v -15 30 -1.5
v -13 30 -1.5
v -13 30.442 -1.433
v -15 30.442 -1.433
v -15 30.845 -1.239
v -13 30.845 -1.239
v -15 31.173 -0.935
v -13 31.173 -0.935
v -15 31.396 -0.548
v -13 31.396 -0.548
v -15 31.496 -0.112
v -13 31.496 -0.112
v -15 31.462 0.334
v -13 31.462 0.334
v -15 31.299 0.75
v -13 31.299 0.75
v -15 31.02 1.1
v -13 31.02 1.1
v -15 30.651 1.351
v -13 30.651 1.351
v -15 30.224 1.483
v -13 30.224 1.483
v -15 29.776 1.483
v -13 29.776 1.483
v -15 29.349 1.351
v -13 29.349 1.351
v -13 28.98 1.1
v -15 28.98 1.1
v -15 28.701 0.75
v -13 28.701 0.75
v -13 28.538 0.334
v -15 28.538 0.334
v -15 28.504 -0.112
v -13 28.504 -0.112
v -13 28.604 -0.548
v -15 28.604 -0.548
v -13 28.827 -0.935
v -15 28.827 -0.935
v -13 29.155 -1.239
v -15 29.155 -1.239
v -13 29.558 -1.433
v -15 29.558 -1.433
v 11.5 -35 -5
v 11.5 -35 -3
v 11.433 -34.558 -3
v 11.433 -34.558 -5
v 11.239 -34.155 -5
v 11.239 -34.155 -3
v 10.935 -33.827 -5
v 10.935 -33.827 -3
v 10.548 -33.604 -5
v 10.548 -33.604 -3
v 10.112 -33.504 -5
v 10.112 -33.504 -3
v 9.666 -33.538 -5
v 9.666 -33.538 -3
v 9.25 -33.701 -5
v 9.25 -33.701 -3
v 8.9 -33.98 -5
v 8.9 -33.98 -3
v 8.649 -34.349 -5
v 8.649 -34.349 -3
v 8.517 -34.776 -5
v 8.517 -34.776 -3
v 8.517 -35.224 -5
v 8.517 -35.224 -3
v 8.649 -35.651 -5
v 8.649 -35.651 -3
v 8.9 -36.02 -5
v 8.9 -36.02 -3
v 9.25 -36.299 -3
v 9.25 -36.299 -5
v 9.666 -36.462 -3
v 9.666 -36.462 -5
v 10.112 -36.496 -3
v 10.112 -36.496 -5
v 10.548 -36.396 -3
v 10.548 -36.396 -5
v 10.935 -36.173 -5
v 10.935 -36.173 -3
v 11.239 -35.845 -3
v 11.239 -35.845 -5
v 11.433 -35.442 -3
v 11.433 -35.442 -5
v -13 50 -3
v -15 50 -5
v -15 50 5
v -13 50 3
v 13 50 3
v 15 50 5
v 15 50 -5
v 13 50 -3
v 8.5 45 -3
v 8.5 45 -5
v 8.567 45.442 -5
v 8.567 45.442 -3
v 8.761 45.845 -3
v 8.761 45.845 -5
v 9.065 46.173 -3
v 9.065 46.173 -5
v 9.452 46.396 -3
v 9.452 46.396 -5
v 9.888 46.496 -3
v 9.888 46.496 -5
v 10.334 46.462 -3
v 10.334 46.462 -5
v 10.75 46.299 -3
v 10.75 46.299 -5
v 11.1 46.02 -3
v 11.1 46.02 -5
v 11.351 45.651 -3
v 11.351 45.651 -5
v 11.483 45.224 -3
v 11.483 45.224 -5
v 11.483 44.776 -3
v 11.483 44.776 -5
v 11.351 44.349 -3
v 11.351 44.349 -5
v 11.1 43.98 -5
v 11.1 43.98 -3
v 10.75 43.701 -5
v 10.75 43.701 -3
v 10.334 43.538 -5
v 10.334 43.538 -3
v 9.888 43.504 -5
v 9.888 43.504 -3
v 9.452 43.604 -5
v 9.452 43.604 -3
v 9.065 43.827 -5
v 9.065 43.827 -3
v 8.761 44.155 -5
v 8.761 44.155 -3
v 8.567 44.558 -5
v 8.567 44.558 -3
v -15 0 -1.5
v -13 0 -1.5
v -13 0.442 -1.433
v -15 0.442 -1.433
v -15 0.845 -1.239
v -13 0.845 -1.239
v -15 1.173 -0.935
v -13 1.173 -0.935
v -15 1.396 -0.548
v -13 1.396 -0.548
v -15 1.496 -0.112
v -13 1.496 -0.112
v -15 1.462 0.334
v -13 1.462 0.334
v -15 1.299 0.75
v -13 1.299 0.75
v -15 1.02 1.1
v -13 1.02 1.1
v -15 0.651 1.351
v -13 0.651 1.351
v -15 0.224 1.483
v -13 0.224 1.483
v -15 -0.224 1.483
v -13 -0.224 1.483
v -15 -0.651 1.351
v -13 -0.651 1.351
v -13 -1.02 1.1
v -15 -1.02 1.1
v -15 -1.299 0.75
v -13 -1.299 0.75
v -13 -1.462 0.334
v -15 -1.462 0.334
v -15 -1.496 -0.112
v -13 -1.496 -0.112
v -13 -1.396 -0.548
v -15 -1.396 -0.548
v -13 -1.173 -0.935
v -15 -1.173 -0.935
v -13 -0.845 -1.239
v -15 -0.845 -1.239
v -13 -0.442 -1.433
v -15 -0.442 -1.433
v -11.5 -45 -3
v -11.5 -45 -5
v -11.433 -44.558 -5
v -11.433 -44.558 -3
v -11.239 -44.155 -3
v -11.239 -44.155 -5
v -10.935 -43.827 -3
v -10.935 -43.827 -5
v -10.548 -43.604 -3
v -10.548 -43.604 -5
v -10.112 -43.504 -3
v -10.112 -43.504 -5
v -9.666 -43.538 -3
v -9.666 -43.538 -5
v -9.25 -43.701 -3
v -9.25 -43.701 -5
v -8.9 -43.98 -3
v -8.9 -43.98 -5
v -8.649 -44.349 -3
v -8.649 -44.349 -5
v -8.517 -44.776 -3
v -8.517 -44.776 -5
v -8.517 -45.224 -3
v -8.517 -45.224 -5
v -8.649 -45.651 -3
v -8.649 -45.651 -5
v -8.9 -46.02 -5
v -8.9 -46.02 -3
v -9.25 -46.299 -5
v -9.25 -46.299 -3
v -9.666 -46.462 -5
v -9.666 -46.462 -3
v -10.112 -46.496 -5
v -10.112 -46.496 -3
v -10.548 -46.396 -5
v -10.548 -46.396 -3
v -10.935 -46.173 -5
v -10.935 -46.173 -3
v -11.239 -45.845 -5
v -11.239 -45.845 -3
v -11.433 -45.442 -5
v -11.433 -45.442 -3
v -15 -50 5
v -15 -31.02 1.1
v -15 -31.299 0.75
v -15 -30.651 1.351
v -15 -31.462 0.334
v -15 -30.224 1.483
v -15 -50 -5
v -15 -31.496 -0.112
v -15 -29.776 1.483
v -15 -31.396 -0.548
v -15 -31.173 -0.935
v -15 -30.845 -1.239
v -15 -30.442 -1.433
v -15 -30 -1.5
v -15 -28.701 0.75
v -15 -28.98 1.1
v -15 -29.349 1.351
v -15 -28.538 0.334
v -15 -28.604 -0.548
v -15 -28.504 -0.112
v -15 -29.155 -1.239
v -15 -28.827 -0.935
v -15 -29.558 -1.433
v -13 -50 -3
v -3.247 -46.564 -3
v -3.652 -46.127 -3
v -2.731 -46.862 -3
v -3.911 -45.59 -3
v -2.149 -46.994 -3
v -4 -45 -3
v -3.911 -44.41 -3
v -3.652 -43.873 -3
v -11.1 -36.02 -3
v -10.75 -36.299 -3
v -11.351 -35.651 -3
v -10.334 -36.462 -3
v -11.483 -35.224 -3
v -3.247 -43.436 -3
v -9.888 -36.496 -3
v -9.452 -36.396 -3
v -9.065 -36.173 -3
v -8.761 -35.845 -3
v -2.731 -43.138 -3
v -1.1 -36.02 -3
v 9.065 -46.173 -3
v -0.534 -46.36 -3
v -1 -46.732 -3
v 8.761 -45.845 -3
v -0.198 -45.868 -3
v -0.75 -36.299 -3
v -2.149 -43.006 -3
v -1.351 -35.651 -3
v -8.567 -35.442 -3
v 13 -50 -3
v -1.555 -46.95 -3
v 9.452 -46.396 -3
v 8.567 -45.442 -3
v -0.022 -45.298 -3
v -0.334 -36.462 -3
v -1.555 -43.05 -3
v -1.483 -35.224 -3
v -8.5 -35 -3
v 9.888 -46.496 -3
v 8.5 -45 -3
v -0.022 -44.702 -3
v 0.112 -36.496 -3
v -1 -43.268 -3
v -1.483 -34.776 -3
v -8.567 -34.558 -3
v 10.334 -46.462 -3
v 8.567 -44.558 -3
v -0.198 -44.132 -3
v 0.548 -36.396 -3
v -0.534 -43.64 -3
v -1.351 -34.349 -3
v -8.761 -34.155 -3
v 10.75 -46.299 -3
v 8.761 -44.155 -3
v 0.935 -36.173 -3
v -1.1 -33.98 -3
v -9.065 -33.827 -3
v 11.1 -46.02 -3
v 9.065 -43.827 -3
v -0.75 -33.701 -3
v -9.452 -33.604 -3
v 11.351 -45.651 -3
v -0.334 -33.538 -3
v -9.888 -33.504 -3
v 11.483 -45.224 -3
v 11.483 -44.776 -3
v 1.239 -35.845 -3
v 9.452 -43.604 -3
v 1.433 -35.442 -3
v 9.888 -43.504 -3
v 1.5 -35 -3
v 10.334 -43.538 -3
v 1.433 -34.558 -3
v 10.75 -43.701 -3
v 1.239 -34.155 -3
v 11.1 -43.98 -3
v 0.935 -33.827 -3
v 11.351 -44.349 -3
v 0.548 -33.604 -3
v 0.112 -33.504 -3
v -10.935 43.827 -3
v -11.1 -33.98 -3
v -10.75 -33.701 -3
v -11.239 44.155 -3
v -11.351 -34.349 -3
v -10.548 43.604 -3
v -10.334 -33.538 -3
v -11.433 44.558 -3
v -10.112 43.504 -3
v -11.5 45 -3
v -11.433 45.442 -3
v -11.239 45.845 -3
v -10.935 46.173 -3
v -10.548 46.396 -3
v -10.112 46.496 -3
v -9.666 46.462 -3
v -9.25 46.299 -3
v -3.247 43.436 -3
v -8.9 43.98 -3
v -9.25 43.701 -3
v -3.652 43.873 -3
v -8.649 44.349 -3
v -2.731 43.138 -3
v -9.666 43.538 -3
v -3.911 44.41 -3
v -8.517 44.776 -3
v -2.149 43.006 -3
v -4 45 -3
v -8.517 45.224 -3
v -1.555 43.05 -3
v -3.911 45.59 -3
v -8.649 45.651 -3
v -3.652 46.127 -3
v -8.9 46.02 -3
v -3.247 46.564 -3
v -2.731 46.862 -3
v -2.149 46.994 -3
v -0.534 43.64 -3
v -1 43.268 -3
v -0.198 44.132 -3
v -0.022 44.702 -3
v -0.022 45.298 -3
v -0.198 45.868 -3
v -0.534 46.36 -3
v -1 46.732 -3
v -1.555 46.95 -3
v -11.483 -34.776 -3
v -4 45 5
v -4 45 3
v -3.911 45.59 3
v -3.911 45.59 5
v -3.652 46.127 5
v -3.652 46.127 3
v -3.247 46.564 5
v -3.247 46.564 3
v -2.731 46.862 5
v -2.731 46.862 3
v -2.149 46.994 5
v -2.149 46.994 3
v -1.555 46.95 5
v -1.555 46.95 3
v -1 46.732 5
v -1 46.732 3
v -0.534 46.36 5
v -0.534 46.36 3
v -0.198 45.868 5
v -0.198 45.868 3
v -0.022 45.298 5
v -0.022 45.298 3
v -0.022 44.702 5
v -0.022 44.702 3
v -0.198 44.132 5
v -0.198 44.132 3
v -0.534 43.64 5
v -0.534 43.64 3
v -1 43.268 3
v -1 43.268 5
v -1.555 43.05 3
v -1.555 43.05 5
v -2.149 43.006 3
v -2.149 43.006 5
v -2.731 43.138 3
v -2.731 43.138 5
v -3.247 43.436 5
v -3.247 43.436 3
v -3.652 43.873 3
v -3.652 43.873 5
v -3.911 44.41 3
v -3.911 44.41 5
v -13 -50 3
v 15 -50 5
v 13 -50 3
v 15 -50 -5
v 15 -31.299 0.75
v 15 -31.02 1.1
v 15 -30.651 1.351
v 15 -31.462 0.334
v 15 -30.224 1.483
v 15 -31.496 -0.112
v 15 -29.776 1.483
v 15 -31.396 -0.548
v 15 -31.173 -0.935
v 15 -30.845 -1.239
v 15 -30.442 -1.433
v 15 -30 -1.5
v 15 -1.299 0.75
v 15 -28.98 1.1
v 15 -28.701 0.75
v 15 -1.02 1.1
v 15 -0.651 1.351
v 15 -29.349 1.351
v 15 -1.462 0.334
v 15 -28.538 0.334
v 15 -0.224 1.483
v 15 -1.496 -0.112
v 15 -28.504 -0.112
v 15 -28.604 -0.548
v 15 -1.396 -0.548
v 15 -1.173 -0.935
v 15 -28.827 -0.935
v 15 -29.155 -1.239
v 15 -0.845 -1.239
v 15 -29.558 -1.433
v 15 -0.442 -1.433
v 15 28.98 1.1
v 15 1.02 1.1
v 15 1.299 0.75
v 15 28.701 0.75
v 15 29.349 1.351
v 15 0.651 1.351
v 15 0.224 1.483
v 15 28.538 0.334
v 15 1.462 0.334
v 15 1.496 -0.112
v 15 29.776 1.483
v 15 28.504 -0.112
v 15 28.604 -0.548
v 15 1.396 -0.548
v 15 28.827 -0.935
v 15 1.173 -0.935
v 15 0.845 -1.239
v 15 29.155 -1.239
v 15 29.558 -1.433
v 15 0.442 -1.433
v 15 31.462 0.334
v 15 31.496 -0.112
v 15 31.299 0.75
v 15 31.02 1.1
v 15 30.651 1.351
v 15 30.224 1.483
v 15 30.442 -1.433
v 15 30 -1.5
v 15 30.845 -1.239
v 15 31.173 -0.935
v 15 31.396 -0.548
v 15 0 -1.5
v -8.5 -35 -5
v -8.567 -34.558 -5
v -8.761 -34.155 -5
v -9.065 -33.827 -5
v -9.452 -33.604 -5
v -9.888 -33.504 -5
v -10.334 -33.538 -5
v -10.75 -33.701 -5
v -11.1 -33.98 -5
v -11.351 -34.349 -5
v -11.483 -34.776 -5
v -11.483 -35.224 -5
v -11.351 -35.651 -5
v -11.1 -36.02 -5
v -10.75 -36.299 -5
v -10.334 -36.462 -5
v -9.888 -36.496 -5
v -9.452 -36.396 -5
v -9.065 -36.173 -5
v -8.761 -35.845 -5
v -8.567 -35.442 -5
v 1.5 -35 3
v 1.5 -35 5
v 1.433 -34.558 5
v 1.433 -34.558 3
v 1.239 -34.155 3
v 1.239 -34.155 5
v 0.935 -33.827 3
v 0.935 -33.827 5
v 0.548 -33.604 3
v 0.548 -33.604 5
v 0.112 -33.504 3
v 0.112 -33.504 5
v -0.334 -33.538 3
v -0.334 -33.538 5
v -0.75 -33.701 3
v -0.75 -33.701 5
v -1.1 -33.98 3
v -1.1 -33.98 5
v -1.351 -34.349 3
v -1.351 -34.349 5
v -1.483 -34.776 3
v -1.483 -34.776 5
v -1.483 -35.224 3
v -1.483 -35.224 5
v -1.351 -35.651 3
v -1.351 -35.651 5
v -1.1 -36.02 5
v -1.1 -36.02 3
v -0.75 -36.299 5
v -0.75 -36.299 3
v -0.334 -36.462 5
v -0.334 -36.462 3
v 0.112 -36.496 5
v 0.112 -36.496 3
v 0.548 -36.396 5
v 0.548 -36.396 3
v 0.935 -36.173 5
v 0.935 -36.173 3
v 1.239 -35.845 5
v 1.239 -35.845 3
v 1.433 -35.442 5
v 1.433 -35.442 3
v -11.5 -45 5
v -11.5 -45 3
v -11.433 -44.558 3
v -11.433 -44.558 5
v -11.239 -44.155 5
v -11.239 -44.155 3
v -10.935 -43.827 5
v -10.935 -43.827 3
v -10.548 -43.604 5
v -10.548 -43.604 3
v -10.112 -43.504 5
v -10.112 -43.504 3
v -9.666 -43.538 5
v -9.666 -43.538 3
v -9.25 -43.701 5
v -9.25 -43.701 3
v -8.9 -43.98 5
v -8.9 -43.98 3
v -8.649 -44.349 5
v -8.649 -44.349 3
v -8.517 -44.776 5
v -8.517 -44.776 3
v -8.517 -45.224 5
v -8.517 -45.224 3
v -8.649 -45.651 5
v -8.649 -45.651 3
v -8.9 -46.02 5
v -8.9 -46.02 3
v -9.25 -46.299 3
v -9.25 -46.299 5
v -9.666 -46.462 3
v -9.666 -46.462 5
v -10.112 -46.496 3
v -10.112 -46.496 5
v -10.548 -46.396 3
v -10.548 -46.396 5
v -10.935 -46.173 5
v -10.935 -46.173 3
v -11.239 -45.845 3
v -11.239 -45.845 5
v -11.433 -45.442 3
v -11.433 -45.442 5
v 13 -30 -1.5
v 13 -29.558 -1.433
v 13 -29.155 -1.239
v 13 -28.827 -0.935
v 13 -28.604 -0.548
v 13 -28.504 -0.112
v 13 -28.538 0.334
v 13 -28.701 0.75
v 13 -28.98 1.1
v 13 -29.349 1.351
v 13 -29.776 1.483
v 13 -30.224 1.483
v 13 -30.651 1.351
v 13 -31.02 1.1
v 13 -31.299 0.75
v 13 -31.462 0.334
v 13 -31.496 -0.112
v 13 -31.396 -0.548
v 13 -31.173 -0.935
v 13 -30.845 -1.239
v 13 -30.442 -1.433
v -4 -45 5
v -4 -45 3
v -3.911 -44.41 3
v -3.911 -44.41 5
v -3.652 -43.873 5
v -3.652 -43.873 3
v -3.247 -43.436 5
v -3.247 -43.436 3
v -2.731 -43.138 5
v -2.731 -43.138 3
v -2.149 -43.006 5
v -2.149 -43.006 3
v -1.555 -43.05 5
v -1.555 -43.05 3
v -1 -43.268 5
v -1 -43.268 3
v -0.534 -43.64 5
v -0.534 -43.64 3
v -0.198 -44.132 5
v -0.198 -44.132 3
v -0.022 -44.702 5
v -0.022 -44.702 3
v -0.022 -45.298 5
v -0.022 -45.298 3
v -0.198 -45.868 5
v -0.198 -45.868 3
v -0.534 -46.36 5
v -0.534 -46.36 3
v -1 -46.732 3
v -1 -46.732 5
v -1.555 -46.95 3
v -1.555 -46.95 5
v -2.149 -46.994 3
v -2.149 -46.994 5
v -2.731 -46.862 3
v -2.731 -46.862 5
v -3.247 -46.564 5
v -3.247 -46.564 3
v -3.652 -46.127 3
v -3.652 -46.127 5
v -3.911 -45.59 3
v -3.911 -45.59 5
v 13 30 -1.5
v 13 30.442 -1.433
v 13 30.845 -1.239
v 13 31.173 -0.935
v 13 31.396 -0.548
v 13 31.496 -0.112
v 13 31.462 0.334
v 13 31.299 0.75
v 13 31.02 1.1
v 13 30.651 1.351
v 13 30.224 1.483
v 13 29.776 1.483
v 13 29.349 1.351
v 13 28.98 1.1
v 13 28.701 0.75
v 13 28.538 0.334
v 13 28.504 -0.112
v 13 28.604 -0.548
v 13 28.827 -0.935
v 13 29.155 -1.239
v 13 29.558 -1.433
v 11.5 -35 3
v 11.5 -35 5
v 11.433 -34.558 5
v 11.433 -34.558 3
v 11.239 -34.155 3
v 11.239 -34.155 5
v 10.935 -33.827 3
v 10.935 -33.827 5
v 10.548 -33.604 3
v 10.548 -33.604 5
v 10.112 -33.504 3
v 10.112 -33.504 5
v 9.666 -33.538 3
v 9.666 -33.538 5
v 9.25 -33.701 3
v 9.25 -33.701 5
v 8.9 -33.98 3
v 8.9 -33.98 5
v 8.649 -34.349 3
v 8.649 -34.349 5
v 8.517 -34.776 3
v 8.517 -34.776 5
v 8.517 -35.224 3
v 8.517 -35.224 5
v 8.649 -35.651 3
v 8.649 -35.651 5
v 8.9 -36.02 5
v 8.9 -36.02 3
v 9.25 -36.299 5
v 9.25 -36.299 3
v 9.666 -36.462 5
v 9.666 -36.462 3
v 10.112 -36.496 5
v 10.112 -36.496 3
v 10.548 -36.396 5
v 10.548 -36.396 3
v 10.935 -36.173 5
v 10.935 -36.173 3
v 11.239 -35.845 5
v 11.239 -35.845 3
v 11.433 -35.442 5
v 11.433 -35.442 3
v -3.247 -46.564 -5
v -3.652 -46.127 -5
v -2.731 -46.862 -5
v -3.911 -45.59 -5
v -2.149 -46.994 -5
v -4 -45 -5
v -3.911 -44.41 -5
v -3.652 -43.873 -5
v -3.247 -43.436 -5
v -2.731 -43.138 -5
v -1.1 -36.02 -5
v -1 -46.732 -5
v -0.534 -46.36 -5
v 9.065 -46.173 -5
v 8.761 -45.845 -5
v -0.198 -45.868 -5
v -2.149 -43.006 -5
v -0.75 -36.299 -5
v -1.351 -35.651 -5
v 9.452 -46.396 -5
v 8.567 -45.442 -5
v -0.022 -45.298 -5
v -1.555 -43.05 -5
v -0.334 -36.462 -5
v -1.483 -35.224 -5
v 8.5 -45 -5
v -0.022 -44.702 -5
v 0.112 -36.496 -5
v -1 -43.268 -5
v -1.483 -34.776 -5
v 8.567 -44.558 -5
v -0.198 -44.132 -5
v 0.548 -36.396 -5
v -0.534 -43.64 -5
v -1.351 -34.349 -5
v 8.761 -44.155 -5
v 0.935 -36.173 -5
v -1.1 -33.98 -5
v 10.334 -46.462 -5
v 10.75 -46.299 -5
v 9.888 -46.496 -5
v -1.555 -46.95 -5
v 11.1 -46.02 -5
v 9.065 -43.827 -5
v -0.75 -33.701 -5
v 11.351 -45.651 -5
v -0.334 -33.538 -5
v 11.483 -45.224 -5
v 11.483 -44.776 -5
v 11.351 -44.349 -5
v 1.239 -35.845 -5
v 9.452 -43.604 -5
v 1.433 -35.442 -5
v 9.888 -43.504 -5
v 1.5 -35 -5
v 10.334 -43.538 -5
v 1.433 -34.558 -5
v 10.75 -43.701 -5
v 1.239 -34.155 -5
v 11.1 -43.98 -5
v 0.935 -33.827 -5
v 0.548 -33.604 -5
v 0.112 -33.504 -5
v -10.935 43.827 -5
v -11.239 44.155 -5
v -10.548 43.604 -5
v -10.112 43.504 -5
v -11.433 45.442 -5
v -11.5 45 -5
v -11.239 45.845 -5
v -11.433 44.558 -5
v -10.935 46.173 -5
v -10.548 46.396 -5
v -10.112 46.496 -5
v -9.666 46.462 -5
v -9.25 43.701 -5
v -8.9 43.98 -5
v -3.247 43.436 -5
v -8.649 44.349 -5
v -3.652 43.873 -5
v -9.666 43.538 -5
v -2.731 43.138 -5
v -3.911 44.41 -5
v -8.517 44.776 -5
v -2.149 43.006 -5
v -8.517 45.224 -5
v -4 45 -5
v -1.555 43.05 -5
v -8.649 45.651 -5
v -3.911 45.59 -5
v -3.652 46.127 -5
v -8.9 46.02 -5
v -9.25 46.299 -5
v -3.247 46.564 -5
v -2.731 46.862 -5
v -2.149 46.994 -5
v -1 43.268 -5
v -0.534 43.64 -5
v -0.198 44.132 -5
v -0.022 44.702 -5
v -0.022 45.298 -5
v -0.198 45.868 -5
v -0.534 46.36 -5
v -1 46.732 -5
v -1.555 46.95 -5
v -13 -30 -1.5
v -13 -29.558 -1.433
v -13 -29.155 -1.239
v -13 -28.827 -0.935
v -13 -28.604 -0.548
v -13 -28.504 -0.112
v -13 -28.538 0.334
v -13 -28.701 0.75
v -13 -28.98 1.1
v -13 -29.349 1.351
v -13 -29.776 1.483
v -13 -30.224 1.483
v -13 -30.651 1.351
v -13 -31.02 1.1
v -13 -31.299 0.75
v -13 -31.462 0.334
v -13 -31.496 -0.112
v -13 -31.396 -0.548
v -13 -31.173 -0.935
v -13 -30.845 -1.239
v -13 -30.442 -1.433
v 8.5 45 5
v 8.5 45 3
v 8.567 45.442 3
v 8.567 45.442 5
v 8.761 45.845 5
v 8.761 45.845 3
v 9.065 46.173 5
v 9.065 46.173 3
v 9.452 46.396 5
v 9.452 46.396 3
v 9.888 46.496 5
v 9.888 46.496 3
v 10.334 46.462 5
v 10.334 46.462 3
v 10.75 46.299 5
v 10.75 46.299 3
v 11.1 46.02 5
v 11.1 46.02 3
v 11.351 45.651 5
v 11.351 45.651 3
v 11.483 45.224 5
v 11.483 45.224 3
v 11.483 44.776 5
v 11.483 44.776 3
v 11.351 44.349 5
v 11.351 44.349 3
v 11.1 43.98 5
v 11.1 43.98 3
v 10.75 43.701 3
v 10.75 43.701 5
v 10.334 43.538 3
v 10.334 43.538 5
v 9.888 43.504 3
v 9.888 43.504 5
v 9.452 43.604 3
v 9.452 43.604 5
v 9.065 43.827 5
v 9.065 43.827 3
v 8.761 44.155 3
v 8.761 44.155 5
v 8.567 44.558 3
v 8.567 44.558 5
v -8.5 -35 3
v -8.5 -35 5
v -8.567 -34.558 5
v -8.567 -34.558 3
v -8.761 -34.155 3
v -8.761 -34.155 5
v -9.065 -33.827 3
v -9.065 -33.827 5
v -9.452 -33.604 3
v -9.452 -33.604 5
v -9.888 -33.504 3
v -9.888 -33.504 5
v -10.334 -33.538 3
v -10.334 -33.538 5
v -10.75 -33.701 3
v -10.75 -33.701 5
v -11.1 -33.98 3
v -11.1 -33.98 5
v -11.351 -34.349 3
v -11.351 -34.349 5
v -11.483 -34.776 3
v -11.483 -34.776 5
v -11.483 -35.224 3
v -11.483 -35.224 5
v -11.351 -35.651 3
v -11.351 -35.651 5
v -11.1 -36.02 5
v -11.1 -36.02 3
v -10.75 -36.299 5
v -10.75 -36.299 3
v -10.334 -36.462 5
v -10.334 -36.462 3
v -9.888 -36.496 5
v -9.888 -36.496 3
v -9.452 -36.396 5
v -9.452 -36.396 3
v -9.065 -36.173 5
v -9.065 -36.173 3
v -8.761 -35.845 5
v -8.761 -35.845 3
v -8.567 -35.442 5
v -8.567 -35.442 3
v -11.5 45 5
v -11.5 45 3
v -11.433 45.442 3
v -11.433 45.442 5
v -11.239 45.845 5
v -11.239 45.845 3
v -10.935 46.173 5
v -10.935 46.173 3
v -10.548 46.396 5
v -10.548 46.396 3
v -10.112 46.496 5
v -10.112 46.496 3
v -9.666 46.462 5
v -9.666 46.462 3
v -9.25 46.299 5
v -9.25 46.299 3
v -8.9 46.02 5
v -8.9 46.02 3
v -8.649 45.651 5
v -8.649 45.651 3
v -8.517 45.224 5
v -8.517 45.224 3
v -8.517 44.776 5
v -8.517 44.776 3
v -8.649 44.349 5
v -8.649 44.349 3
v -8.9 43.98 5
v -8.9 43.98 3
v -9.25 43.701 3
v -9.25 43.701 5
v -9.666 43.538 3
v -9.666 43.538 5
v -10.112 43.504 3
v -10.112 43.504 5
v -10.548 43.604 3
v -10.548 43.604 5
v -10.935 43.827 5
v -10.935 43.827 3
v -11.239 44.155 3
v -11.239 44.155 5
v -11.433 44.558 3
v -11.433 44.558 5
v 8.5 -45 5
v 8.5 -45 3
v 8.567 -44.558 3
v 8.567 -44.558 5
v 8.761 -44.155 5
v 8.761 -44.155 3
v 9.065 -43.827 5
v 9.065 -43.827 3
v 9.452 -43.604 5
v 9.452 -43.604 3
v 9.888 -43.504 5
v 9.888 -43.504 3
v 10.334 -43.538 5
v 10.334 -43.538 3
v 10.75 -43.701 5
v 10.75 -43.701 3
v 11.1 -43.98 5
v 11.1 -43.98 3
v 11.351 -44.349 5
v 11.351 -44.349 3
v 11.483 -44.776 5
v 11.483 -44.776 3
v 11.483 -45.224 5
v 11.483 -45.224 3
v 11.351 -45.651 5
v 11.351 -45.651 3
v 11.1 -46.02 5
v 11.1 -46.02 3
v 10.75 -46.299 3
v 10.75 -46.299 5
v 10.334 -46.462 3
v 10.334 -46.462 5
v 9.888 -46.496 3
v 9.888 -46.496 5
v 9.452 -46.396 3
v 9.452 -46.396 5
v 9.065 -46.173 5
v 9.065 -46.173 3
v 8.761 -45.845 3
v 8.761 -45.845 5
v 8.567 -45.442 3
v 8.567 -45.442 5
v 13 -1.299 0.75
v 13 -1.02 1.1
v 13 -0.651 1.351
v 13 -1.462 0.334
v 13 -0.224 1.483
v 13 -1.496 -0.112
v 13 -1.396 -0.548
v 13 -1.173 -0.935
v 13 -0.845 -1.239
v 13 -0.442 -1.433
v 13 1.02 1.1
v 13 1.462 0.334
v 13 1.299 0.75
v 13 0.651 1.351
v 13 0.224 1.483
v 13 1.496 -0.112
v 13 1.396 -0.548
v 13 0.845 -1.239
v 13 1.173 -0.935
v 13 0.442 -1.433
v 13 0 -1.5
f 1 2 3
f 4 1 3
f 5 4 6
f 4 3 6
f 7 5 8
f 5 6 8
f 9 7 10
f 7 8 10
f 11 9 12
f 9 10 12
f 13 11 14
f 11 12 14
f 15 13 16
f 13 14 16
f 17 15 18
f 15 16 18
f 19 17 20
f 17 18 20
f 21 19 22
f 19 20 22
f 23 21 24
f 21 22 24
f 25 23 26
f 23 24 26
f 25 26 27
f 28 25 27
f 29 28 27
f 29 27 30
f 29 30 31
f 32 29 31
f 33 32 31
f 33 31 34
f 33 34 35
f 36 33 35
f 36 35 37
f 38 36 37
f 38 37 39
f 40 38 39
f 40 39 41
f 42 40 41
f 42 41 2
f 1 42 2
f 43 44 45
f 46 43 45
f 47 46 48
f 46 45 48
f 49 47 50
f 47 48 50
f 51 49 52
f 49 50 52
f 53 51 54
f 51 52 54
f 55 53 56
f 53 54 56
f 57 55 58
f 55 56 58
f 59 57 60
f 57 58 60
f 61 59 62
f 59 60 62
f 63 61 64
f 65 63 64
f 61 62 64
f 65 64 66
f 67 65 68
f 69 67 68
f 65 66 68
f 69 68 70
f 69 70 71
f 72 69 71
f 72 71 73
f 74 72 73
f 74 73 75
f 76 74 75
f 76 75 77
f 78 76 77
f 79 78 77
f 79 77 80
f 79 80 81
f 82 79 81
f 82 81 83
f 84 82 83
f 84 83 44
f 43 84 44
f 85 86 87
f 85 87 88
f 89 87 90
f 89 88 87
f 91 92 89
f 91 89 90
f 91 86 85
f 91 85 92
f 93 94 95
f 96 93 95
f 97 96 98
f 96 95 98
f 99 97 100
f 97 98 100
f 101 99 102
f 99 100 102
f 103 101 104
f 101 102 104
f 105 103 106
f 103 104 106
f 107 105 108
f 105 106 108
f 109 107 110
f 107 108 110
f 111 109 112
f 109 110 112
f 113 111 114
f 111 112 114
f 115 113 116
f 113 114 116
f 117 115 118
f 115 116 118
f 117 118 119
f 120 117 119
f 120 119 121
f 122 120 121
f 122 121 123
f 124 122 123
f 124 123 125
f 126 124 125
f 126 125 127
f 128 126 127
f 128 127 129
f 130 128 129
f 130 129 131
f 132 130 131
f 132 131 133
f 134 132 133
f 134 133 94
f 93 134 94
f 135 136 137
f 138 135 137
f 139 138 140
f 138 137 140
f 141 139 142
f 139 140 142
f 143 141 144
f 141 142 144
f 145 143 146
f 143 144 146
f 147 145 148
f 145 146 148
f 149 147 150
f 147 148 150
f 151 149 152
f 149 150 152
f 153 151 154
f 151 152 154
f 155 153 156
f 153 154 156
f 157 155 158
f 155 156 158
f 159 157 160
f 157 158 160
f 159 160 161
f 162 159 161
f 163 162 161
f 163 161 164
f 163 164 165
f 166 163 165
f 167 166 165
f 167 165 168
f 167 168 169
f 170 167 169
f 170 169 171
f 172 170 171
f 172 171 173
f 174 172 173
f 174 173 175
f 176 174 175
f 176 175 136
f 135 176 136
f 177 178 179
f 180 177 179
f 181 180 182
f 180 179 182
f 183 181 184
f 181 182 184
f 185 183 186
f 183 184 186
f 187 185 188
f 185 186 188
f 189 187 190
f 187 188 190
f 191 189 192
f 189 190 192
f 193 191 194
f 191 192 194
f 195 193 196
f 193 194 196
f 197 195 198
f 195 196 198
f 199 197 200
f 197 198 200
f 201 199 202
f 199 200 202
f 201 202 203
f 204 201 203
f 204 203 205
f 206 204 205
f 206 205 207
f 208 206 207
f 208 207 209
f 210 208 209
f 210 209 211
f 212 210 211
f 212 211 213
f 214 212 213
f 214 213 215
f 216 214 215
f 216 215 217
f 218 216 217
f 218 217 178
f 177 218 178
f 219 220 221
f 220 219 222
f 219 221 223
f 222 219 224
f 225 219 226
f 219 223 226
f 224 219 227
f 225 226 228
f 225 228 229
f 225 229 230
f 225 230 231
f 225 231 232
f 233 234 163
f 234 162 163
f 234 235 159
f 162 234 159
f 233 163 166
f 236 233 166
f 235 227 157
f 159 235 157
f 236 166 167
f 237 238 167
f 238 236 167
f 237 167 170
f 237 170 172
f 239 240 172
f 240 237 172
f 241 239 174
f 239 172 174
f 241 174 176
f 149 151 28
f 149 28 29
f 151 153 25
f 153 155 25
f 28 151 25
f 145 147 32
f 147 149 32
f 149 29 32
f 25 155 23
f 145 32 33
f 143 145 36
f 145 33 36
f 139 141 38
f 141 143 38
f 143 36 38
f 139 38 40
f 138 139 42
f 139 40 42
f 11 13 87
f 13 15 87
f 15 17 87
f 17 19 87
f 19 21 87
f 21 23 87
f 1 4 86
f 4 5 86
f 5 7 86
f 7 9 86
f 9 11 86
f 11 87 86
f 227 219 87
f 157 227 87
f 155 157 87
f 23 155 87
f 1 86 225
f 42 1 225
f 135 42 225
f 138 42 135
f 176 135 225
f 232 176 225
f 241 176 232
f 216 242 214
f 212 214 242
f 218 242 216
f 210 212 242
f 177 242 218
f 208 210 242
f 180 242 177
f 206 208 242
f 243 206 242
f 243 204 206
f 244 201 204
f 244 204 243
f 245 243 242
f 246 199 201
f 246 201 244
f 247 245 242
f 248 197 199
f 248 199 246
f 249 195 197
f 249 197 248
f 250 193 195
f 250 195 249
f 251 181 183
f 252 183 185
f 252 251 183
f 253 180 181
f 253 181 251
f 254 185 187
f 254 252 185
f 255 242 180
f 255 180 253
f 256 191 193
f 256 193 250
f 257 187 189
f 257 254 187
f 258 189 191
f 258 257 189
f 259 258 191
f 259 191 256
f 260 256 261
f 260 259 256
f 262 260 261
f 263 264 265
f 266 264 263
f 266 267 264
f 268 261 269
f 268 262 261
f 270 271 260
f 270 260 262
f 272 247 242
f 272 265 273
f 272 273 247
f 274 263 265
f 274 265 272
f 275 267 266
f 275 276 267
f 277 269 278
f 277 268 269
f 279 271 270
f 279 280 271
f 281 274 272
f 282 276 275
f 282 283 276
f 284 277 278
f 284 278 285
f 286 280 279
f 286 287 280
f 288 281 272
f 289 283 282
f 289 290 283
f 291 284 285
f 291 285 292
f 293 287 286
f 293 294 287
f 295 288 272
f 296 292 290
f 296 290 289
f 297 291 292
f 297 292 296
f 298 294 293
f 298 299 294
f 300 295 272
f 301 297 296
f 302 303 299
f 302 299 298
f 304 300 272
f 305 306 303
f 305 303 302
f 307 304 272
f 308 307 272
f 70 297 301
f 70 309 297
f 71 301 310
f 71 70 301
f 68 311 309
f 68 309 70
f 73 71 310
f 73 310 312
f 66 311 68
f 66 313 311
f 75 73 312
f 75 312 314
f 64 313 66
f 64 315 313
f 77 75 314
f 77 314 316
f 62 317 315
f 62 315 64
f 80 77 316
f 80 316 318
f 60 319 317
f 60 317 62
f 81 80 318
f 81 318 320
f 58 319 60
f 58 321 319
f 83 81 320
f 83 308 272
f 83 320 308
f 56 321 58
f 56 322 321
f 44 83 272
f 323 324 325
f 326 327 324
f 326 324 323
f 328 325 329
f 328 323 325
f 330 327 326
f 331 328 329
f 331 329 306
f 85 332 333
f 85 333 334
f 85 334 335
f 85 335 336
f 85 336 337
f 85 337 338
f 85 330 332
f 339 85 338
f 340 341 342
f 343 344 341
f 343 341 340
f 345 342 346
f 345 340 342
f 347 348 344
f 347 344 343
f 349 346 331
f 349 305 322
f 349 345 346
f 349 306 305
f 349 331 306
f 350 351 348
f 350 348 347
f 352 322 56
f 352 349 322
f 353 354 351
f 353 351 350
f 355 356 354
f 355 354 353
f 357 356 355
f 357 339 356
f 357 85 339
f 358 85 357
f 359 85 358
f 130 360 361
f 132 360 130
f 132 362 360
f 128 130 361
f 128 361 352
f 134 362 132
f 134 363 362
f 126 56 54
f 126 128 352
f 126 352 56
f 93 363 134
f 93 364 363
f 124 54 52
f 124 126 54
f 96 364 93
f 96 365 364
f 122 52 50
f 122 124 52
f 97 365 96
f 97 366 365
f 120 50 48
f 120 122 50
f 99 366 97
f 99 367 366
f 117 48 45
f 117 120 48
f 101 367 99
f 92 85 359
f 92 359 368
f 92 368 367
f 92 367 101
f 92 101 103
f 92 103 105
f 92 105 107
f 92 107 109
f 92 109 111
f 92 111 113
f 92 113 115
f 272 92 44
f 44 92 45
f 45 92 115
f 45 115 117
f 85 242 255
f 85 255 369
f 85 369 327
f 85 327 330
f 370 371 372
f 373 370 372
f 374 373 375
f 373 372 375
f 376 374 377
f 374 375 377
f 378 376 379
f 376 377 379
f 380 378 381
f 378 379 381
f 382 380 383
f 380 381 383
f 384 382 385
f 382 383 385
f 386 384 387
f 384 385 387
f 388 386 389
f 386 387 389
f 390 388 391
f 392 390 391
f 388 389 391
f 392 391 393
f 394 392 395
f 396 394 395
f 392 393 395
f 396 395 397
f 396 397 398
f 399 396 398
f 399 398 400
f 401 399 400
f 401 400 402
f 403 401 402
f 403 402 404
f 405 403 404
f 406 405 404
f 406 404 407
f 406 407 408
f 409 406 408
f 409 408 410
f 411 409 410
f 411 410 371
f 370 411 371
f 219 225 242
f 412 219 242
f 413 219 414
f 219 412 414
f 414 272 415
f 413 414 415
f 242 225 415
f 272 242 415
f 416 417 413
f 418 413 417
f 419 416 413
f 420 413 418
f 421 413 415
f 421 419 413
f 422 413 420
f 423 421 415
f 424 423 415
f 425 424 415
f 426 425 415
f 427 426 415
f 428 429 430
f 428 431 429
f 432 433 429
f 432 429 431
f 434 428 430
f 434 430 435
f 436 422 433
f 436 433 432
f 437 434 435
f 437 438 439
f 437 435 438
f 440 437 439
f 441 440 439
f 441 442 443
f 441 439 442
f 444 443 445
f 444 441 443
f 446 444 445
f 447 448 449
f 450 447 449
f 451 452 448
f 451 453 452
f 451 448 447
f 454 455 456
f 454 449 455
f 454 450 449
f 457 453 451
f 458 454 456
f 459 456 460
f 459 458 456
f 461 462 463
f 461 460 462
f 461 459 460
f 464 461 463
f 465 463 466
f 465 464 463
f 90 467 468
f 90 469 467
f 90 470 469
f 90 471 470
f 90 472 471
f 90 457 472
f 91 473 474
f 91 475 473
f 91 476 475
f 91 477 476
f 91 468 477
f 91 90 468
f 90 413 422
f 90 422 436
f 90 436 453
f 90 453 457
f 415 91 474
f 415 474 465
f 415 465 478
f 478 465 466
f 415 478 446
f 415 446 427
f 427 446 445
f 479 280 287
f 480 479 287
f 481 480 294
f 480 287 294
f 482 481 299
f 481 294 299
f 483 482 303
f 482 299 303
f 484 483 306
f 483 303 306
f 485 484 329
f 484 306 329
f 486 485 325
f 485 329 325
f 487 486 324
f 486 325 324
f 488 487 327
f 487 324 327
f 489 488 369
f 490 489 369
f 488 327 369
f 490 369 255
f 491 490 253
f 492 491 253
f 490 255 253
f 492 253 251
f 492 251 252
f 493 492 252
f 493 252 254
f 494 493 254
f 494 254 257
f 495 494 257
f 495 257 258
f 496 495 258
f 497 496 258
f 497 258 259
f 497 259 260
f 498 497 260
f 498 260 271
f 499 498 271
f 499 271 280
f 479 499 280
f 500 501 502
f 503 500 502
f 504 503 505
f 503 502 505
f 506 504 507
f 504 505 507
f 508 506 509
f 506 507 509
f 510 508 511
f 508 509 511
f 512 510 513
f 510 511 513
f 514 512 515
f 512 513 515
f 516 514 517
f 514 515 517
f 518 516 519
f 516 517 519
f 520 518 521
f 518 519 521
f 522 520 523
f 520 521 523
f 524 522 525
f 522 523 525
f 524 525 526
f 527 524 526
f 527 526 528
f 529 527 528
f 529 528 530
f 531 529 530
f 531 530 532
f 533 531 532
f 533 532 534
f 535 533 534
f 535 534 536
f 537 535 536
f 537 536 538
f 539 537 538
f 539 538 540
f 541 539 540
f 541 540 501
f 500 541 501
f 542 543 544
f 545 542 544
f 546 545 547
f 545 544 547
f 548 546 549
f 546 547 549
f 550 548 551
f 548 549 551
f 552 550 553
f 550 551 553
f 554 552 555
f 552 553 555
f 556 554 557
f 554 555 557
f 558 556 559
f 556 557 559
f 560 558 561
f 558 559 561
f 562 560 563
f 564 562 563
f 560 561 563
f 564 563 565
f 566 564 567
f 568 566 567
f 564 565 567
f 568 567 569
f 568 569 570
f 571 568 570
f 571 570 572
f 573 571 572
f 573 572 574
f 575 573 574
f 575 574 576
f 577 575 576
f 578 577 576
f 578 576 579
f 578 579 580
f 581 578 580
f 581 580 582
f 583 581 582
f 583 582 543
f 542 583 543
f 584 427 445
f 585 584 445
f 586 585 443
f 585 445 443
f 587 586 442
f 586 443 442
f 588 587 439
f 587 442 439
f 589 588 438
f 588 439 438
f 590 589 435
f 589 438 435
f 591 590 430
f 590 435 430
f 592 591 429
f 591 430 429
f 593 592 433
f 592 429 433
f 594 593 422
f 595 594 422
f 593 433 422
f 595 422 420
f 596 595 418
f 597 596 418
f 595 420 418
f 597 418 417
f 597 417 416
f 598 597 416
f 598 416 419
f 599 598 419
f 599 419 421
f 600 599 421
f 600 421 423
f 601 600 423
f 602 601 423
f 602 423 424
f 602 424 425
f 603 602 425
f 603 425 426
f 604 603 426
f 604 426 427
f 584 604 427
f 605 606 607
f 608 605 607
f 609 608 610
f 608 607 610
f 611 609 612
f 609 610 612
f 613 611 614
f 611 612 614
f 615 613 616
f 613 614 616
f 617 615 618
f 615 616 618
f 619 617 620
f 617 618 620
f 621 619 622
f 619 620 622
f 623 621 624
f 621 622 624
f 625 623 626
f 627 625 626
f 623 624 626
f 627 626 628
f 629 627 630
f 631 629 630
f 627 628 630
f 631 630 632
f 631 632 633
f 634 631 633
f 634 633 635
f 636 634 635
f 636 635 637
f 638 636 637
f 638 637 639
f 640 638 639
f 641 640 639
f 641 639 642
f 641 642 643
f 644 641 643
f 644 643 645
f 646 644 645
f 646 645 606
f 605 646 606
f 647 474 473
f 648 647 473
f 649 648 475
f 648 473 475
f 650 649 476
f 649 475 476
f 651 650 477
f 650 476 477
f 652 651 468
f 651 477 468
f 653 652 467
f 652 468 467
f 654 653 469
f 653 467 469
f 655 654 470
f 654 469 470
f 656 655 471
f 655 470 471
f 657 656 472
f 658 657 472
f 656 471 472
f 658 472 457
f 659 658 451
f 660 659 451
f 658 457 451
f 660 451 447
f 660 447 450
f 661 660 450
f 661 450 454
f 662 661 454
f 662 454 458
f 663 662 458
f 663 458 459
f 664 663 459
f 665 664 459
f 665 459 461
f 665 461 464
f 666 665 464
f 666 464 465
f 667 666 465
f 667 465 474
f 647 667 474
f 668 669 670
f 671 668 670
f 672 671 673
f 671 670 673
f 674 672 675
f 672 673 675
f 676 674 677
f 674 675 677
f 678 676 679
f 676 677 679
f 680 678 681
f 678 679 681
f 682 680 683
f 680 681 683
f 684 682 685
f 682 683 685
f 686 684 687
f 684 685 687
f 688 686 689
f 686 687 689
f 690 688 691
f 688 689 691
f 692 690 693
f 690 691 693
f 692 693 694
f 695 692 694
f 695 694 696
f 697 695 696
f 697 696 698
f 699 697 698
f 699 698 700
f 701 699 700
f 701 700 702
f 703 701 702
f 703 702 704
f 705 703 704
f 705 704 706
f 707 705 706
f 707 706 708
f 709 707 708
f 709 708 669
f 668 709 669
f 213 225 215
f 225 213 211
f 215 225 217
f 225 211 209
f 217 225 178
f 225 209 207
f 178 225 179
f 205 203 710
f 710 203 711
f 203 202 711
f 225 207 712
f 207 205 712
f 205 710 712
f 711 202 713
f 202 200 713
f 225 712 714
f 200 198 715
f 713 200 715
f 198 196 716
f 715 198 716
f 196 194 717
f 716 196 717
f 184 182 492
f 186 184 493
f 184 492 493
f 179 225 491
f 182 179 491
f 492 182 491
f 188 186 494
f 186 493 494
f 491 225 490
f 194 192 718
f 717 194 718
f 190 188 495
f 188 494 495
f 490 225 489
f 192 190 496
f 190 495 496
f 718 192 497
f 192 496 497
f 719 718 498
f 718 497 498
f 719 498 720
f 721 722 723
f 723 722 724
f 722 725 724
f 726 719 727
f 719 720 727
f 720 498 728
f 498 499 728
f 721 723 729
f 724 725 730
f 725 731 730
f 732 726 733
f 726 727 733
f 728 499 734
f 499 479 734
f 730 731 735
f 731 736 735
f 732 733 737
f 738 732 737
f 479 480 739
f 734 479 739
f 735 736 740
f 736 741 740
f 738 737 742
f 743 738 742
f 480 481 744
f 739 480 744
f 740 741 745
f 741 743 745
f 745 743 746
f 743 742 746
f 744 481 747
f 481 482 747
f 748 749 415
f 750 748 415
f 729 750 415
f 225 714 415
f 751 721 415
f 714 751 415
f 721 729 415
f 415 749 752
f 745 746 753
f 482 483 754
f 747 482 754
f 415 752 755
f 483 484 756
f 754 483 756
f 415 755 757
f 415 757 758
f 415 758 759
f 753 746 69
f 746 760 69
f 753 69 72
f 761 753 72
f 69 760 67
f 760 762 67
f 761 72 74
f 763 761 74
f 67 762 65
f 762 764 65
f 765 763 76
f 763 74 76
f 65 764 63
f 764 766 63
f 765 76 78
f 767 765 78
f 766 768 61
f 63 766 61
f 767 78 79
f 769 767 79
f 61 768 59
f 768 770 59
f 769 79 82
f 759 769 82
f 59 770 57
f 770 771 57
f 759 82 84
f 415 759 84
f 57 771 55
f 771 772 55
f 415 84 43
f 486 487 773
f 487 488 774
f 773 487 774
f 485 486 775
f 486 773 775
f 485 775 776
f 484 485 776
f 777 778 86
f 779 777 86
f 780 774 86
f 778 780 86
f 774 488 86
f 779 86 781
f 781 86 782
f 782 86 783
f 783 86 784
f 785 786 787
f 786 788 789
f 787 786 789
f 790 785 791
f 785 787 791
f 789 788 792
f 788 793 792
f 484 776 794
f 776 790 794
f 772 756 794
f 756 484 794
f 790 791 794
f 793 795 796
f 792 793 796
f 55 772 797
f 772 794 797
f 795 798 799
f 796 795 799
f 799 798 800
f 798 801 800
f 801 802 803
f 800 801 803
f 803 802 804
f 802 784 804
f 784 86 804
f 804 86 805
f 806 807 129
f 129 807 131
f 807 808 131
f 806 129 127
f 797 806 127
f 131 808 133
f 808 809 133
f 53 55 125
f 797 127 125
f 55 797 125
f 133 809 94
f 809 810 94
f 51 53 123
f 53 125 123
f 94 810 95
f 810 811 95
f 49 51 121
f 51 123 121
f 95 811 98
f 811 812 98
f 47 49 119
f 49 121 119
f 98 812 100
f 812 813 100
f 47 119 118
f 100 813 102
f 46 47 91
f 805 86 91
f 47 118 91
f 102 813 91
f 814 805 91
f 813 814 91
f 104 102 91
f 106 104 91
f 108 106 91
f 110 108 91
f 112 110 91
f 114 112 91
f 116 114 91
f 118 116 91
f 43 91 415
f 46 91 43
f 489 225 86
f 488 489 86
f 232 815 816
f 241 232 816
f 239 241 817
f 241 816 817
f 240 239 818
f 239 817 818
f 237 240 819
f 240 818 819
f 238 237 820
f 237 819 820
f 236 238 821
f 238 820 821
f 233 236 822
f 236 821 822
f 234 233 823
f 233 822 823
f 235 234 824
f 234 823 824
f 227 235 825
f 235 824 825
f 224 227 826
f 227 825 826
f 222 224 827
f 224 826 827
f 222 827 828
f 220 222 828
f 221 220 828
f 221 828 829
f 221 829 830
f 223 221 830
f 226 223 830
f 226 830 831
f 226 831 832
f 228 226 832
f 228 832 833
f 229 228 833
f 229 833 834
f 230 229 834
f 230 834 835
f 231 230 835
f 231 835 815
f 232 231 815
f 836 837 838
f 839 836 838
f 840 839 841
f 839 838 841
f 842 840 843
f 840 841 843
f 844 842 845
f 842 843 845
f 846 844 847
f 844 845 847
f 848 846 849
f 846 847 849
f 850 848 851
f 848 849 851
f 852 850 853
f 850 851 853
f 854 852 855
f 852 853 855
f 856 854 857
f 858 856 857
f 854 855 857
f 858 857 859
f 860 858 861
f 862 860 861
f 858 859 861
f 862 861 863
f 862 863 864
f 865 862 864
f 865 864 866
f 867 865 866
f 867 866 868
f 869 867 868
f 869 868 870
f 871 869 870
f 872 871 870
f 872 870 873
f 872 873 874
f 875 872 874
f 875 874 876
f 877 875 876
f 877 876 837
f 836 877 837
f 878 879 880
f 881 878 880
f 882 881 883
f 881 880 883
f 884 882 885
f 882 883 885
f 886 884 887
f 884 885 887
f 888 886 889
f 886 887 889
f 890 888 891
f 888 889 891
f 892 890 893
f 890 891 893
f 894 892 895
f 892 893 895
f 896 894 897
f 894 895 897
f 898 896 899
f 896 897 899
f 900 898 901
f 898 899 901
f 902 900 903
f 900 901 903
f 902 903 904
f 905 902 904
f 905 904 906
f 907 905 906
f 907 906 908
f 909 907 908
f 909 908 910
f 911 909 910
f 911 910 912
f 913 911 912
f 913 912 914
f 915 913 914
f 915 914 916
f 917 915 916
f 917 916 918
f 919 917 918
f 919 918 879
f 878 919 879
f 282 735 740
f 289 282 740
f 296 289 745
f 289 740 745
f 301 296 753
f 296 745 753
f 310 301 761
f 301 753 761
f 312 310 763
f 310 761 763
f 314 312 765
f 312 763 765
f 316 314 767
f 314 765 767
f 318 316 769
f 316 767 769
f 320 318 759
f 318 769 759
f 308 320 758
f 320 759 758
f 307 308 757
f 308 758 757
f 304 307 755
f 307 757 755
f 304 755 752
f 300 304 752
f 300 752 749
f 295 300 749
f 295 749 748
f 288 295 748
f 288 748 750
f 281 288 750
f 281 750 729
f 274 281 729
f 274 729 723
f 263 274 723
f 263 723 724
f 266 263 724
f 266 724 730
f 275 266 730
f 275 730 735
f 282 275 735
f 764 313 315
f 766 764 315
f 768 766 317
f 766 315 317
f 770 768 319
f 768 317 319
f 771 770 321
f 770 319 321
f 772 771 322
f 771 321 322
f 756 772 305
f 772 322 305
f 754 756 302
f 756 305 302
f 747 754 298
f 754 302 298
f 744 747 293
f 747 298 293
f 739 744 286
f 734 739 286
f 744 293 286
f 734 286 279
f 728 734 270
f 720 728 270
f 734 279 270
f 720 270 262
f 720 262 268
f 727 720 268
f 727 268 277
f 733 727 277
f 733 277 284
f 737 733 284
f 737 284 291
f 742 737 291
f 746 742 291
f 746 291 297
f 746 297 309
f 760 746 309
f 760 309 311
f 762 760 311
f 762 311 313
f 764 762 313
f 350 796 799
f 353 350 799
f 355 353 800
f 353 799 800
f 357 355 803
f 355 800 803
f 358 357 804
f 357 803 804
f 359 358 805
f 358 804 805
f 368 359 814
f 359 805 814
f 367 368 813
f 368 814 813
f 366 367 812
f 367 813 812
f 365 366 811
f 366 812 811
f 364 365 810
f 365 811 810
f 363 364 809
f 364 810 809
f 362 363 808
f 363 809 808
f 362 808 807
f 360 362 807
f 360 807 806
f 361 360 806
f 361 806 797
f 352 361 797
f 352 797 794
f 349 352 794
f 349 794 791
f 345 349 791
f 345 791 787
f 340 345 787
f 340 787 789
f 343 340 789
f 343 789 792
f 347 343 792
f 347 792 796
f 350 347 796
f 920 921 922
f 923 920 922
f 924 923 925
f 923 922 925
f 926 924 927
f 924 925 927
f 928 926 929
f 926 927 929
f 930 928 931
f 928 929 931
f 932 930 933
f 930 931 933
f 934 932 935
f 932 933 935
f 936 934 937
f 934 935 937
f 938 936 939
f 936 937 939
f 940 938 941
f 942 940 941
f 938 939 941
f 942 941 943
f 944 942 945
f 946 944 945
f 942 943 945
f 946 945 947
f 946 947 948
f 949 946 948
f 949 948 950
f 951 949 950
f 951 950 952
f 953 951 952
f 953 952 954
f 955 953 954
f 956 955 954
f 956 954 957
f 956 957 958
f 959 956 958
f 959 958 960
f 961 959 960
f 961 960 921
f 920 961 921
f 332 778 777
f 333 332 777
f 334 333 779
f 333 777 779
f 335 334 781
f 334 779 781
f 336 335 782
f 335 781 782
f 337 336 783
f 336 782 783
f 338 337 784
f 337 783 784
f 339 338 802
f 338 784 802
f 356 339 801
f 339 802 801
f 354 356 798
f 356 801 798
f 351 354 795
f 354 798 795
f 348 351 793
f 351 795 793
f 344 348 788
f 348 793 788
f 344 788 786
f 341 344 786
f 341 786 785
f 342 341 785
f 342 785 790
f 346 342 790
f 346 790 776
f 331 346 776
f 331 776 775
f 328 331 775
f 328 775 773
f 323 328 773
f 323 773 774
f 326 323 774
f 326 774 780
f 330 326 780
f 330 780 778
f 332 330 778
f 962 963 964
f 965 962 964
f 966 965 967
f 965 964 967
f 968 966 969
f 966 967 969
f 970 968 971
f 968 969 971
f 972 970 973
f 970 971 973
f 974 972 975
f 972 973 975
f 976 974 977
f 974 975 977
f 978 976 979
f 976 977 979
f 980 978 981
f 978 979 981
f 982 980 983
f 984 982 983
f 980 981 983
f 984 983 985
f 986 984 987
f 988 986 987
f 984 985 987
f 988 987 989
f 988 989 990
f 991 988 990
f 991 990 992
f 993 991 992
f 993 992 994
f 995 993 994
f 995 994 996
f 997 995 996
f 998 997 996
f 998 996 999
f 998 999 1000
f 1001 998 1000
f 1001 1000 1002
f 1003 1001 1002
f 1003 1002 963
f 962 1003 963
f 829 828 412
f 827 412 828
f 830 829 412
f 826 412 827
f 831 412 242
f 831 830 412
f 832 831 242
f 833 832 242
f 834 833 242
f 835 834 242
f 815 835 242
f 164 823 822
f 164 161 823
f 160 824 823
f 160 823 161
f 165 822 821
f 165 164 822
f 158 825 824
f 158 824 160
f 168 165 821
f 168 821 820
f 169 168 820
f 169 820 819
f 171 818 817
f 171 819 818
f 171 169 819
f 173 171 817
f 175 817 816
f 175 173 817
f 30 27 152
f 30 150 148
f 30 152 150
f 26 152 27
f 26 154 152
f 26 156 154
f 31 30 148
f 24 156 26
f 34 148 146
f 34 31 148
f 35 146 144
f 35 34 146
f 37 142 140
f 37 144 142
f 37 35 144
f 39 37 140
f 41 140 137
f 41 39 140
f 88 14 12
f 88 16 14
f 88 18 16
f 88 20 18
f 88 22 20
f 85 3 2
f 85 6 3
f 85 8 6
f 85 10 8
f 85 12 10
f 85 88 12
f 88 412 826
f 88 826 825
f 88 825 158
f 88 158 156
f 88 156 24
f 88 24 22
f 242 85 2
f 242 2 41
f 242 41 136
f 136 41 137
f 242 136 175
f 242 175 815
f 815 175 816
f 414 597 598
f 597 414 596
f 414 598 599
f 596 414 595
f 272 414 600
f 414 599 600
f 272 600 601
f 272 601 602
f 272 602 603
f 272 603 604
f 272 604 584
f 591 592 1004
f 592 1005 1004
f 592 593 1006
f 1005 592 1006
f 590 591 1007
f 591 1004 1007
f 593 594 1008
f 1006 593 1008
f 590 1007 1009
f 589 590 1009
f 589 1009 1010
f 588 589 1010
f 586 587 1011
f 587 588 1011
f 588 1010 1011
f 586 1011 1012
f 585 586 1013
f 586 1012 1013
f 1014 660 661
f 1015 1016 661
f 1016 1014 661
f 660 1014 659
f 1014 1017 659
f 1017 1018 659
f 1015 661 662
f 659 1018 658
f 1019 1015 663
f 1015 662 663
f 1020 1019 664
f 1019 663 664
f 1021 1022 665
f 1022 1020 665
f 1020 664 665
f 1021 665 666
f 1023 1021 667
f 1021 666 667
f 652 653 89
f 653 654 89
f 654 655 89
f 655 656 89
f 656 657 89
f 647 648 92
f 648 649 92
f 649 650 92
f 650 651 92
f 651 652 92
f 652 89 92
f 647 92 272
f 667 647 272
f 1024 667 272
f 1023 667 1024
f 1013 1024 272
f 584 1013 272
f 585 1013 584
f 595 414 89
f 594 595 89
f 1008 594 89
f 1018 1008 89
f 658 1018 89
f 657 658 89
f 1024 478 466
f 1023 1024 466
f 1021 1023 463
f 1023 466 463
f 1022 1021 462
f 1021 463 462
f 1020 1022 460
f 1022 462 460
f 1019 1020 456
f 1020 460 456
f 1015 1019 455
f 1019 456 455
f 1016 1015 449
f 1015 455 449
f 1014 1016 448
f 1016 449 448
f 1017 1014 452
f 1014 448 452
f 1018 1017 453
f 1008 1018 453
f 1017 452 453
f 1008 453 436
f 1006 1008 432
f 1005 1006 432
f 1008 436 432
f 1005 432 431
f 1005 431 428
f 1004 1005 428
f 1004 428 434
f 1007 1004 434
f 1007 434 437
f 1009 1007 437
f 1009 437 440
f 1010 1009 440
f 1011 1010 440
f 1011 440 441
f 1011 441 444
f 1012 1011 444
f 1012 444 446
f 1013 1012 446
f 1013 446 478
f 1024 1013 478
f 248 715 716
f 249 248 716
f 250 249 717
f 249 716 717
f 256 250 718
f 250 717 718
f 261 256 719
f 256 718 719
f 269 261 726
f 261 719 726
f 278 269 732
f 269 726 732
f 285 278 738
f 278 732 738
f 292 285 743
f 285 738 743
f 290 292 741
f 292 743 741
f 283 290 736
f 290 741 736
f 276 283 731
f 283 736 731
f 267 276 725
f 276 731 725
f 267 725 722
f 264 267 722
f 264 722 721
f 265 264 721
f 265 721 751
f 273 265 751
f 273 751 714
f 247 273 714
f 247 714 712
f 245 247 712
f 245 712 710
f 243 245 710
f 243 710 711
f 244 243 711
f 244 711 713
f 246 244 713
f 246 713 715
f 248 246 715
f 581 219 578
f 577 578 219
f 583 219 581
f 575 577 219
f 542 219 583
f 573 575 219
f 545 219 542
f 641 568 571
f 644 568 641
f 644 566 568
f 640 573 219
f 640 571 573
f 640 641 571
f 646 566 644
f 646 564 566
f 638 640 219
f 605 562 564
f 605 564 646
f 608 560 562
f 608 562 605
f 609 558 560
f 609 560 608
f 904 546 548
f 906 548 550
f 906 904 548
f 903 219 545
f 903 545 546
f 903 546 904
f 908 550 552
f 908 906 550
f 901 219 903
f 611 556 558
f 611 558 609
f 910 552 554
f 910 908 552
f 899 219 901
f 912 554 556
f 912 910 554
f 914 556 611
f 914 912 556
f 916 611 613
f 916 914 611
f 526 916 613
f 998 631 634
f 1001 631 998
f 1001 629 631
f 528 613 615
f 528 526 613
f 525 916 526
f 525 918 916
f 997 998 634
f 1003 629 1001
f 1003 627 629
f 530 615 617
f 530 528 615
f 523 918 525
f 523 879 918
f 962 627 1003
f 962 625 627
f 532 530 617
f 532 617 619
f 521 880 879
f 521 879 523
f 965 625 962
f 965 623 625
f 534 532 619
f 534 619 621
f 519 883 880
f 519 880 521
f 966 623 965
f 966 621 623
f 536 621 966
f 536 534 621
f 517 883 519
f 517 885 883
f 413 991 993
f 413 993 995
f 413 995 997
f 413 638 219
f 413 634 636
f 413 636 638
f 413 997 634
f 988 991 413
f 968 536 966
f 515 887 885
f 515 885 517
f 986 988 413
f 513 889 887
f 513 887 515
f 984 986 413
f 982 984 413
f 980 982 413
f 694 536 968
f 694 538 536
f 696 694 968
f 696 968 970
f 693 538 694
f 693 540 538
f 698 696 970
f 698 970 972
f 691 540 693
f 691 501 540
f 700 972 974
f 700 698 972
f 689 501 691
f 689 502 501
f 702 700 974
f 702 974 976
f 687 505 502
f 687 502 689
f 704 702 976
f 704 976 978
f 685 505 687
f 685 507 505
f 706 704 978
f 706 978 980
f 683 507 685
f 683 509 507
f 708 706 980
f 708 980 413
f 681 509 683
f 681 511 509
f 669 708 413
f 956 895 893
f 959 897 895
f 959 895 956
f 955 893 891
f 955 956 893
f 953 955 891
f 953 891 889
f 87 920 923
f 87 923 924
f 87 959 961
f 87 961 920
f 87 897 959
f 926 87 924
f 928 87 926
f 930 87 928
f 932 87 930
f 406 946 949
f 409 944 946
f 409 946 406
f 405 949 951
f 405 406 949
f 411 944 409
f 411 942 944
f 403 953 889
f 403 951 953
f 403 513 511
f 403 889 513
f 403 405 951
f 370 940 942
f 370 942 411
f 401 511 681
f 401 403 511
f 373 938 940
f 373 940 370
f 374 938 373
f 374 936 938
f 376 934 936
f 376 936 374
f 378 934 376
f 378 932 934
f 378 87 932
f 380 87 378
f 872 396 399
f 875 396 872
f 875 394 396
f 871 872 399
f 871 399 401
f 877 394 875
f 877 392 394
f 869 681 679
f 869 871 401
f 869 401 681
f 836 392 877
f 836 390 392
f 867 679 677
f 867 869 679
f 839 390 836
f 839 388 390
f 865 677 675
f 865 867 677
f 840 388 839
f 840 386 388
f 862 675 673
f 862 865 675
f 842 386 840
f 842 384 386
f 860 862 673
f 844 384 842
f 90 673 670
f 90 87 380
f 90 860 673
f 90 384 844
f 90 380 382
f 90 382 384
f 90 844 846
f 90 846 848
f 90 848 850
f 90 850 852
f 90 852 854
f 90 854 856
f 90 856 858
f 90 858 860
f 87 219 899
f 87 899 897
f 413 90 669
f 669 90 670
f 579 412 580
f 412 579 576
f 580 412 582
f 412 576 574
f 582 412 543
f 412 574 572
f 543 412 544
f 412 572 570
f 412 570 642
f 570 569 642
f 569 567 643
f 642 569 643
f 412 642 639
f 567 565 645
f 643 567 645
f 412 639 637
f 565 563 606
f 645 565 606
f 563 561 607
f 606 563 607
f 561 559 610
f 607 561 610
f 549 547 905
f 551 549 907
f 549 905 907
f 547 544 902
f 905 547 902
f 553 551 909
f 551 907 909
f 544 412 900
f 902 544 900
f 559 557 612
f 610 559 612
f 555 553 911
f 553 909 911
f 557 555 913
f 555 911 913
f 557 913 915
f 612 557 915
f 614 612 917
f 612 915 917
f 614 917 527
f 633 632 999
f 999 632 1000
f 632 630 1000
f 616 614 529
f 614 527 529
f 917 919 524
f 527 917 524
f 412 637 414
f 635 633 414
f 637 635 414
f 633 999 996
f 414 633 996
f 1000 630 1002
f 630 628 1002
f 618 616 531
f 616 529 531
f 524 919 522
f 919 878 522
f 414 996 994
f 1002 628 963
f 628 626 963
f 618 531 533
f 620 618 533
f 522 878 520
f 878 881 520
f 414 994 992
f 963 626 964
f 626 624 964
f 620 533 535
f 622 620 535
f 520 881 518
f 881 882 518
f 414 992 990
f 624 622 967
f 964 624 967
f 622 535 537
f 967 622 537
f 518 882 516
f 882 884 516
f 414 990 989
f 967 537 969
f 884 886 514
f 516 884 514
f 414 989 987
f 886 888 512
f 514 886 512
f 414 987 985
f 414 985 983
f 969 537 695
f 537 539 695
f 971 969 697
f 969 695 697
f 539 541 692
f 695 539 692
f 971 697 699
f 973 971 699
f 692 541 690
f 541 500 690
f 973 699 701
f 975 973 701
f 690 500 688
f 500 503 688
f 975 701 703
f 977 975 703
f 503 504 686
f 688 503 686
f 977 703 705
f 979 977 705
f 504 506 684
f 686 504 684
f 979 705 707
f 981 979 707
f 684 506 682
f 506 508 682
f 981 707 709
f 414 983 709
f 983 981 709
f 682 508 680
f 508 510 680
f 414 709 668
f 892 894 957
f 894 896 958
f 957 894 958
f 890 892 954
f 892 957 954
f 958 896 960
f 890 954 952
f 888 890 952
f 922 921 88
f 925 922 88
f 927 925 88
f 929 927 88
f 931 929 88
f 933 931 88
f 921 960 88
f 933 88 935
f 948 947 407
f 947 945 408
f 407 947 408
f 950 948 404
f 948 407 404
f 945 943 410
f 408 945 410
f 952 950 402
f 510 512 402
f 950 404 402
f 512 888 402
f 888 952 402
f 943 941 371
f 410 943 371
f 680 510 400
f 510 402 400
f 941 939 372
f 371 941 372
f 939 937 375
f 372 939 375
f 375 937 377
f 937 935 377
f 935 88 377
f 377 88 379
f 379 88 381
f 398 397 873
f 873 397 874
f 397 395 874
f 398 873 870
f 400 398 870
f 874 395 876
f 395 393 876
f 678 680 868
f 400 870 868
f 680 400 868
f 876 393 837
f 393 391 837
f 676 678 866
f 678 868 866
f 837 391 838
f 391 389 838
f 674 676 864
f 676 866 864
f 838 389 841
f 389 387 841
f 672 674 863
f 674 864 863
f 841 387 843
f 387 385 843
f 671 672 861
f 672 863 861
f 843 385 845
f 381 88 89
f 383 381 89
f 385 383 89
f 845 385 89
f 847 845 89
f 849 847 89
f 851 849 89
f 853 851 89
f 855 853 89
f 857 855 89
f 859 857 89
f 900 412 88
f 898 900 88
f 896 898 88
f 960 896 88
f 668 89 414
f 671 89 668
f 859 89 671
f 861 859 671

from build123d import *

# Parameters (mm, degrees)
SKETCH_1_W          = 30
SKETCH_1_H          = 10
SKETCH_1_W_2        = 26
SKETCH_1_H_2        = 6
EXTRUDE_1_DEPTH     = 50
SKETCH_2_R          = 2
SKETCH_2_R_2        = 1.5
CUT_EXTRUDE_1_DEPTH = 54.150729064
SKETCH_3_R          = 1.5
CUT_EXTRUDE_2_DEPTH = 54.150729064
SKETCH_4_R          = 1.5
CUT_EXTRUDE_3_DEPTH = 59.523499554


with BuildPart() as part:
    # 草图1 → 凸台-拉伸1 (new, symmetric)
    with BuildSketch(Plane(origin=(0, 0, 0), x_dir=(1, 0, 0), z_dir=(0, 1, 0))):
        Rectangle(SKETCH_1_W, SKETCH_1_H)
        Rectangle(SKETCH_1_W_2, SKETCH_1_H_2, mode=Mode.SUBTRACT)
    extrude(amount=EXTRUDE_1_DEPTH, both=True)

    # 草图2 → 切除-拉伸1 (cut, through all)
    with BuildSketch(Plane(origin=(0, 0, -5), x_dir=(-1, 0, 0), z_dir=(0, 0, -1))):
        with Locations((2, 45)):
            Circle(SKETCH_2_R)
        with Locations((10, 45)):
            Circle(SKETCH_2_R_2)
        with Locations((-10, 45)):
            Circle(SKETCH_2_R_2)
        with Locations((-10, -45)):
            Circle(SKETCH_2_R_2)
        with Locations((2, -45)):
            Circle(SKETCH_2_R)
        with Locations((10, -45)):
            Circle(SKETCH_2_R_2)
    extrude(amount=-CUT_EXTRUDE_1_DEPTH, mode=Mode.SUBTRACT)

    # 草图3 → 切除-拉伸2 (cut, through all)
    with BuildSketch(Plane.XY.offset(5)):
        with Locations((0, -35)):
            Circle(SKETCH_3_R)
        with Locations((10, -35)):
            Circle(SKETCH_3_R)
        with Locations((-10, -35)):
            Circle(SKETCH_3_R)
    extrude(amount=-CUT_EXTRUDE_2_DEPTH, mode=Mode.SUBTRACT)

    # 草图4 → 切除-拉伸3 (cut, through all)
    with BuildSketch(Plane(origin=(15, 0, 0), x_dir=(0, 0, -1), z_dir=(1, 0, 0))):
        with Locations((0, 30)):
            Circle(SKETCH_4_R)
        Circle(SKETCH_4_R)
        with Locations((0, -30)):
            Circle(SKETCH_4_R)
    extrude(amount=-CUT_EXTRUDE_3_DEPTH, mode=Mode.SUBTRACT)


solid = part.part
